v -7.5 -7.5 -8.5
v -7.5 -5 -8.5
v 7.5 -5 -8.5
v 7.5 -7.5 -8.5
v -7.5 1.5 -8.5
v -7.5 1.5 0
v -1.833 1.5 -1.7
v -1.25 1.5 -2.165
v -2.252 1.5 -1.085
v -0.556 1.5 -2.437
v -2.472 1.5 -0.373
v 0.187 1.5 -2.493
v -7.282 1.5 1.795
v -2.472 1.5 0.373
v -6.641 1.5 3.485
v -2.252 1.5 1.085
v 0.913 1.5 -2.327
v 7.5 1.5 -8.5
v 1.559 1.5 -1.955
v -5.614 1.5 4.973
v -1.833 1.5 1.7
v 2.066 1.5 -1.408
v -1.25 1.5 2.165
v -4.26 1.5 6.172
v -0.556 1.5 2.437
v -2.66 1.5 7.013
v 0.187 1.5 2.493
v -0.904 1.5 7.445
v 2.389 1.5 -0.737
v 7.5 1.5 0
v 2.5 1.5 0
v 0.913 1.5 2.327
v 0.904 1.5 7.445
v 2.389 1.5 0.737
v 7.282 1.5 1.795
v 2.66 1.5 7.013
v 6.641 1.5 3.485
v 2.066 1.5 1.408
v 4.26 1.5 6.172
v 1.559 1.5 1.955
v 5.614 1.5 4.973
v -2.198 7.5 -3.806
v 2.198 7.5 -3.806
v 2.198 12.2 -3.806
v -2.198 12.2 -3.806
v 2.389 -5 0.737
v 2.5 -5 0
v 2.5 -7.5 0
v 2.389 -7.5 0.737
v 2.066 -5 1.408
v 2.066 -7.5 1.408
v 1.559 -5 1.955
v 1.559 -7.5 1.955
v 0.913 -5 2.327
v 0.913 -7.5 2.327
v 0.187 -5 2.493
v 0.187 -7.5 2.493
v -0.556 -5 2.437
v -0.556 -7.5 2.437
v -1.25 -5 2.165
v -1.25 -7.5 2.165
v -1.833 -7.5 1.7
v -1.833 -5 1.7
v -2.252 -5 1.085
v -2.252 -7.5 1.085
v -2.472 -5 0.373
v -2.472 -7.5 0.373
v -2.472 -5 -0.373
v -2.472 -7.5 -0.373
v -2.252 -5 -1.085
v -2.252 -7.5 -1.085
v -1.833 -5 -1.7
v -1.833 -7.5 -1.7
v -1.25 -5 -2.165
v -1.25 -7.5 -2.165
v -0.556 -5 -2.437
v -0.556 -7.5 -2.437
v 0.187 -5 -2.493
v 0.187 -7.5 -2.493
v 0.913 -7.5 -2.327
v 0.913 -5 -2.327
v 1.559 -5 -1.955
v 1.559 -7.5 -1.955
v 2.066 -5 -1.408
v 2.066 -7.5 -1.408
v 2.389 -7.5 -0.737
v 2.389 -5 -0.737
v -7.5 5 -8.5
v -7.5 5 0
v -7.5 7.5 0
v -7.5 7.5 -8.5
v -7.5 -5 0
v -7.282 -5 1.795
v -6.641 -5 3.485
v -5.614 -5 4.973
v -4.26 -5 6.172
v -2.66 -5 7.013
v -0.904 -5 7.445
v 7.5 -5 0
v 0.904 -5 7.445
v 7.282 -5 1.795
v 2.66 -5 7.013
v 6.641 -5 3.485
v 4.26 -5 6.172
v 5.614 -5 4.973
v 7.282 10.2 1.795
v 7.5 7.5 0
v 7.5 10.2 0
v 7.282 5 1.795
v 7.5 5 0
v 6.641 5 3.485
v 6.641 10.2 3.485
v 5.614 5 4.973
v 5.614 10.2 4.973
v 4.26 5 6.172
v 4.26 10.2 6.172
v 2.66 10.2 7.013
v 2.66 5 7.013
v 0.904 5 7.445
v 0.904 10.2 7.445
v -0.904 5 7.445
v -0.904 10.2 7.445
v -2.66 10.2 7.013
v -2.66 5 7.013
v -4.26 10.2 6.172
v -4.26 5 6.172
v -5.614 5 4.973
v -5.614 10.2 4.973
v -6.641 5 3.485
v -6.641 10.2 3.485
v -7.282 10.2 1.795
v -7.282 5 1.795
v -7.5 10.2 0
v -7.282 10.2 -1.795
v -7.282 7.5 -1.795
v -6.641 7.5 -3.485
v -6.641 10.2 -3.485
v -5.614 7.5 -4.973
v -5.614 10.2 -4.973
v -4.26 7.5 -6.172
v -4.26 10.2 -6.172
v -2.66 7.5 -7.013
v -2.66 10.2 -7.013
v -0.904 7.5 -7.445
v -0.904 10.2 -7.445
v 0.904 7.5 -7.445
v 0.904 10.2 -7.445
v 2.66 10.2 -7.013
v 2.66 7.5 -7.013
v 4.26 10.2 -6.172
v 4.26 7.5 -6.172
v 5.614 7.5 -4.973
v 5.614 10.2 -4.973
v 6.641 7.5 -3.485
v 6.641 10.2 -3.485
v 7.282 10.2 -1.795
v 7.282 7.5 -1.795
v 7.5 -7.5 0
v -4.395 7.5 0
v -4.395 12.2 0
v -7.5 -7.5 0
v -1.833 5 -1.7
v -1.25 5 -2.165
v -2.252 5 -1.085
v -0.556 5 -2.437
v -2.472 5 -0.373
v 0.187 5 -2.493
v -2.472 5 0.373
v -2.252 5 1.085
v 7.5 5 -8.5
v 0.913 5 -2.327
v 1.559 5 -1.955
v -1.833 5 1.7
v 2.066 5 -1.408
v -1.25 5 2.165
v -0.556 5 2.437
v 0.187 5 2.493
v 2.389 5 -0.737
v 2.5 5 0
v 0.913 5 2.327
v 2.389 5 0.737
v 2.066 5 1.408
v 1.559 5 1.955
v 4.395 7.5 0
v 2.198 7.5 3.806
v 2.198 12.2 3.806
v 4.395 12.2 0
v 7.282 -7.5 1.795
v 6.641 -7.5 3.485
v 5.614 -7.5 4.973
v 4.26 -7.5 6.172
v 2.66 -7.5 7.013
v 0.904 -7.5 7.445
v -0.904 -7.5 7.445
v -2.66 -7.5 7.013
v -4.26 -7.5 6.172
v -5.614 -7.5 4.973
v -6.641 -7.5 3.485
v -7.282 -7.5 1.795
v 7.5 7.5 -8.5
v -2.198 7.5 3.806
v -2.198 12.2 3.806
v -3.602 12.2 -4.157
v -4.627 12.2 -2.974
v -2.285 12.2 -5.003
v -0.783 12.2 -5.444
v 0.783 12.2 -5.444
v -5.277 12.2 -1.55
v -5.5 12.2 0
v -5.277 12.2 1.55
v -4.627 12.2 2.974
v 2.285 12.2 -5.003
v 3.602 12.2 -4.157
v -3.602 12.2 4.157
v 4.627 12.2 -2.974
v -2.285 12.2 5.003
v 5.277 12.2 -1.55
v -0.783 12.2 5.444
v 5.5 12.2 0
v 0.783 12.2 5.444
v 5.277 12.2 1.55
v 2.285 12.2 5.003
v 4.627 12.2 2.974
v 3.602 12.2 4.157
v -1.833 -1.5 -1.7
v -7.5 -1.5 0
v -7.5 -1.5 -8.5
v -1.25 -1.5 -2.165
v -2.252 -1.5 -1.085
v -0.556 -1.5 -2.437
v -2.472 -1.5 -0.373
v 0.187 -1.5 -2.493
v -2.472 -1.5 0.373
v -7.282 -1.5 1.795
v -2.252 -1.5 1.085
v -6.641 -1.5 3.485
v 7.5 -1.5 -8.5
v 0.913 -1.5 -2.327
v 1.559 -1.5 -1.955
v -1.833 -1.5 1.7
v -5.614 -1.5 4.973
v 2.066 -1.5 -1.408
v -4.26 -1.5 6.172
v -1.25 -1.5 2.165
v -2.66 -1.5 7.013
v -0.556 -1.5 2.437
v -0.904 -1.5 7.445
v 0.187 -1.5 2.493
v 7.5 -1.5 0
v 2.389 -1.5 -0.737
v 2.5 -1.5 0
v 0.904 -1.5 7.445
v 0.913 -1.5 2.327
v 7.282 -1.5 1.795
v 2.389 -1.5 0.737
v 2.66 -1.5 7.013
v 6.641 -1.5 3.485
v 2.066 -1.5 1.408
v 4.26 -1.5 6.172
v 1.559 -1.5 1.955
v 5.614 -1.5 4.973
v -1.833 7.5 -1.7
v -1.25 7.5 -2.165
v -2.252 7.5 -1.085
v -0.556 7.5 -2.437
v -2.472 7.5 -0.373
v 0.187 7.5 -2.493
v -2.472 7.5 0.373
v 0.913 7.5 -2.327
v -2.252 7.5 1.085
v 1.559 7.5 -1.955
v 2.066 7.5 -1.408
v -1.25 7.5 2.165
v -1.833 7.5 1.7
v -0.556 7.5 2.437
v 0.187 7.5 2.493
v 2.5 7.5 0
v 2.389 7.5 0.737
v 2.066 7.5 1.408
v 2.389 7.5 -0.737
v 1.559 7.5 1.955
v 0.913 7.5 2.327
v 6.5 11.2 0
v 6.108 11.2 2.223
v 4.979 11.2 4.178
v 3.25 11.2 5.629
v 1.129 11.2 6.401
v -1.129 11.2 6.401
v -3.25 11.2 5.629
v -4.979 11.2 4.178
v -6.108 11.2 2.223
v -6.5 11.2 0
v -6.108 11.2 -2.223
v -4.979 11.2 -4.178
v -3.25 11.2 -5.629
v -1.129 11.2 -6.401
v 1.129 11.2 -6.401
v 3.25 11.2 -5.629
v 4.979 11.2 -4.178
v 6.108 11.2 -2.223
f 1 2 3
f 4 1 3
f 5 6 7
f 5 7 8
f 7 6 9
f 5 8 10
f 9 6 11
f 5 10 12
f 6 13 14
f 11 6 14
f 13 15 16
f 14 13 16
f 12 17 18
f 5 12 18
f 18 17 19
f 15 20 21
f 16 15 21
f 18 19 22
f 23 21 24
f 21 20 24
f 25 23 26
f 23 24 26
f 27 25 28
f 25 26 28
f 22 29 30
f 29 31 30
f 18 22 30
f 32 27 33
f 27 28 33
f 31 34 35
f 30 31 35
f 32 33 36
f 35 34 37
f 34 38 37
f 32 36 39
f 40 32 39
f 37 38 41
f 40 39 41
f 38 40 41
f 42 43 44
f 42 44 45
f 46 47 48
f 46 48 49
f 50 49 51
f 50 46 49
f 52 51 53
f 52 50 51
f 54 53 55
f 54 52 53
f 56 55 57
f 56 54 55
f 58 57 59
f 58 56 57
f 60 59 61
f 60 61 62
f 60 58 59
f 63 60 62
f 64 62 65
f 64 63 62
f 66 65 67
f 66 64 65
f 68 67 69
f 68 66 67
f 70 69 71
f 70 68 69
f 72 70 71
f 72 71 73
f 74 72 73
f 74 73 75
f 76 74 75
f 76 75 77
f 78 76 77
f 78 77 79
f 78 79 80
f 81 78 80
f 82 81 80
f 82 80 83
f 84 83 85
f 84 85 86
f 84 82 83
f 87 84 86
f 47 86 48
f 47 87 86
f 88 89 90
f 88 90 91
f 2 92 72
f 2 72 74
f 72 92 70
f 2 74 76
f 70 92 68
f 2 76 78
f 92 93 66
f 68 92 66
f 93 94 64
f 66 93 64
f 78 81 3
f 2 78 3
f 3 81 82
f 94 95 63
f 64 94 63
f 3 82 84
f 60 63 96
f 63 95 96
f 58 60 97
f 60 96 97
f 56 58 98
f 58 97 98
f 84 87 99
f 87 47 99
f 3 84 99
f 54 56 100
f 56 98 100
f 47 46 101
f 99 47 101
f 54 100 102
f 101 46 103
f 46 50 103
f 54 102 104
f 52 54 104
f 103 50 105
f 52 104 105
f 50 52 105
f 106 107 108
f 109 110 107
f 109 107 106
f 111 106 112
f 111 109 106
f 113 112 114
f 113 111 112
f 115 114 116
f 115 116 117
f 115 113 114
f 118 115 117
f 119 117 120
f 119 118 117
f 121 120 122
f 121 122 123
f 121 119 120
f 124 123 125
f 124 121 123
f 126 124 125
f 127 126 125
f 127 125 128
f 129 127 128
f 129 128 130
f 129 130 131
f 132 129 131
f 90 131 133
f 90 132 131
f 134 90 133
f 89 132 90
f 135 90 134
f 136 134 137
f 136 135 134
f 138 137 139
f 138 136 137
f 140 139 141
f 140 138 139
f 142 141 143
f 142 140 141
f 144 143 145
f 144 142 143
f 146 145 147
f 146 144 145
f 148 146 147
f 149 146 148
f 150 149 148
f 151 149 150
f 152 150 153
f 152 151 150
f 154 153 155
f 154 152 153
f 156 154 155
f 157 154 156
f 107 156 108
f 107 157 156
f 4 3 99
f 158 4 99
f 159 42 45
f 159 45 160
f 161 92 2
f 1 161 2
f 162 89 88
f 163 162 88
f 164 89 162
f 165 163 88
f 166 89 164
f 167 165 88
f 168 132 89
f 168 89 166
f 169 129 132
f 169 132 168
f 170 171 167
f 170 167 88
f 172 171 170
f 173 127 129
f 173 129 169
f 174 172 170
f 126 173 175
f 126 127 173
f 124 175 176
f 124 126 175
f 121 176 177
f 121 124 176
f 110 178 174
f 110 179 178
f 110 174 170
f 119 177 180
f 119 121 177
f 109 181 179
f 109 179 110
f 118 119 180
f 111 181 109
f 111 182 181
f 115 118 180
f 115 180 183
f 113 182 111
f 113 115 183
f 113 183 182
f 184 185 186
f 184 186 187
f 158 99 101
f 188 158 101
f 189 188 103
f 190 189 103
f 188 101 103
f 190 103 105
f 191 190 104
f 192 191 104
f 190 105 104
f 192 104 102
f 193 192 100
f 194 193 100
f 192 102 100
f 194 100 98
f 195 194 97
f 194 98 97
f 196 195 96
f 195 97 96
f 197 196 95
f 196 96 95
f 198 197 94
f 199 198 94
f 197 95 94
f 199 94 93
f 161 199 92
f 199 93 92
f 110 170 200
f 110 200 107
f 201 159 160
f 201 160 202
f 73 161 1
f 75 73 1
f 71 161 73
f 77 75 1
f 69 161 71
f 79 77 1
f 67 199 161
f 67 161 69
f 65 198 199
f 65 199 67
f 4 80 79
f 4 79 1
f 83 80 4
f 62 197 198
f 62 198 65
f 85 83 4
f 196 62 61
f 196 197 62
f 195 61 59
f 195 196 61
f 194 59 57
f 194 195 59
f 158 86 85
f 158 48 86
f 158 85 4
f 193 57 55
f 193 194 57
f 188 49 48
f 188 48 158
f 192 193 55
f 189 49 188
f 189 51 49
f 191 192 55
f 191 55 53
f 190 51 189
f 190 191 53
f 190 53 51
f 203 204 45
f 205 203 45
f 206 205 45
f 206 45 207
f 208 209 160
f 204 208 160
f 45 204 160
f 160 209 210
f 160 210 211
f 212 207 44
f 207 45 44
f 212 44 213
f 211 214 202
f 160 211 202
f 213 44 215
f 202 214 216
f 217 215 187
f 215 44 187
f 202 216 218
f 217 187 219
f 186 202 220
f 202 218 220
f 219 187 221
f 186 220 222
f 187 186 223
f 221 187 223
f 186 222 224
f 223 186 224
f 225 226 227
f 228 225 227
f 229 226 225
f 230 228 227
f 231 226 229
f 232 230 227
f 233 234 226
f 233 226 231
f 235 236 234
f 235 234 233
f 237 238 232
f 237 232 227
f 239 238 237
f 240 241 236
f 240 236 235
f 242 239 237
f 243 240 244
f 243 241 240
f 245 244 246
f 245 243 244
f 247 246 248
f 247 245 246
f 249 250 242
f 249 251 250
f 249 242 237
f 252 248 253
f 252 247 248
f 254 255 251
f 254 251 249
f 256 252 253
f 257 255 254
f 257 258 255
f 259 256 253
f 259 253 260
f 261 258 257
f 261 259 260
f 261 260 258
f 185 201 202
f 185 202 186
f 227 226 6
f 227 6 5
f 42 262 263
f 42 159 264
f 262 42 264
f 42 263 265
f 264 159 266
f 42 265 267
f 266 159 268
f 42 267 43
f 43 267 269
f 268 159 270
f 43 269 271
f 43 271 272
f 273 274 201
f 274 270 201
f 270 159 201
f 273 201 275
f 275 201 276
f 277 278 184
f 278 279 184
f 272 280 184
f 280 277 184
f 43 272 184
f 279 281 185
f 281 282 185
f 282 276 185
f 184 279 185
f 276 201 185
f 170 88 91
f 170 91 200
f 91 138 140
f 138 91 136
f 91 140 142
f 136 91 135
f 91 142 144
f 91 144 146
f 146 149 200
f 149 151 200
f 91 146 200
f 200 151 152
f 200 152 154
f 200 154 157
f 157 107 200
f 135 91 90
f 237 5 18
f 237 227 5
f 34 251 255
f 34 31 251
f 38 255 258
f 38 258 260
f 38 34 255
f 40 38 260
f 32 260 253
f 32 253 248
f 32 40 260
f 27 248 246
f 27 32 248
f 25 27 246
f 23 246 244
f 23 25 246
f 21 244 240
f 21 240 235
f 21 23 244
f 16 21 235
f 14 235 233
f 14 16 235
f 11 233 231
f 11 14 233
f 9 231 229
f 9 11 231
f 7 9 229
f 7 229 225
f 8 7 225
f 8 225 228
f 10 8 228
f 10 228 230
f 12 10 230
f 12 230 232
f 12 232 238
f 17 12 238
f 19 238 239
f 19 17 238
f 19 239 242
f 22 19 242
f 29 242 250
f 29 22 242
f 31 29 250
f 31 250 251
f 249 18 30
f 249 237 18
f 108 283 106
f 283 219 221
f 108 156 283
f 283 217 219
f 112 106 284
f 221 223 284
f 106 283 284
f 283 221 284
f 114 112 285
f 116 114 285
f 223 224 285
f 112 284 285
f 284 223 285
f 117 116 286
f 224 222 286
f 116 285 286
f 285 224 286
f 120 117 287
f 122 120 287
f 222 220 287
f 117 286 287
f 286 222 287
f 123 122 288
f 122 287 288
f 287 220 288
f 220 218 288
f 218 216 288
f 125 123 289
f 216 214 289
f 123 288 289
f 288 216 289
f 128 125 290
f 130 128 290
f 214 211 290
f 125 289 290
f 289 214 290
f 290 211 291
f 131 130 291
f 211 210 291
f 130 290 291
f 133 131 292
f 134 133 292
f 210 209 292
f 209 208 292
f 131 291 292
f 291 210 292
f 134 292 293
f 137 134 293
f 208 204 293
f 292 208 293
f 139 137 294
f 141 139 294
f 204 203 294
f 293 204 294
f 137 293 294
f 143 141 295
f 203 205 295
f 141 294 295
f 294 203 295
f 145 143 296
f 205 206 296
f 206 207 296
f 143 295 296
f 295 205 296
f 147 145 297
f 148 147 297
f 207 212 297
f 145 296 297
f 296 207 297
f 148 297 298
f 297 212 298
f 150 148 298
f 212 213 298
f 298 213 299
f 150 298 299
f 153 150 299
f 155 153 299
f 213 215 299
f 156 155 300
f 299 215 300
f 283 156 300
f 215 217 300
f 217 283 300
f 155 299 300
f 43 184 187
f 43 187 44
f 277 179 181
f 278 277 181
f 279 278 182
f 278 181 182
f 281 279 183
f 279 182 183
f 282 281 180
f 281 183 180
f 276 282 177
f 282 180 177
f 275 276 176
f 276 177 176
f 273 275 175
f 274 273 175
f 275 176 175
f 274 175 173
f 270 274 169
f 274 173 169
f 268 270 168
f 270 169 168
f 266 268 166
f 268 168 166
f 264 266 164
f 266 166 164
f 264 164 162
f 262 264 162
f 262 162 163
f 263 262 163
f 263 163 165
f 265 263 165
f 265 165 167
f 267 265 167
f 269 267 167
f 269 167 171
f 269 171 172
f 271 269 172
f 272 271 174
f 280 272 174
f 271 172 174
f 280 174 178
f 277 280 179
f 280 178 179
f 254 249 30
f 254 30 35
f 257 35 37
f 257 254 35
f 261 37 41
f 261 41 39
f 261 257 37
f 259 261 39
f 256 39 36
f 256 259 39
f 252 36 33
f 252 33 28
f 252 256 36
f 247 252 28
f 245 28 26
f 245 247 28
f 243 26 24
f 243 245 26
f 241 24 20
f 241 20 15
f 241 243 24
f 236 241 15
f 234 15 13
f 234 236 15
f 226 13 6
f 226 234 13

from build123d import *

# Parameters (mm, degrees)
F0_R     = 2.5
F1_DEPTH = 1.5
F2_START = 5
F2_DEPTH = 2.5
F3_START = -5
F3_DEPTH = 2.5
F4_START = -7.5
F4_DEPTH = 4.7
F5_SIZE  = 2


with BuildPart() as f1:
    # F0 (on Front) → F1 (new body, symmetric)
    with BuildSketch(Plane.XZ):
        with BuildLine():
            Line((7.5, -8.5), (7.5, 0))
            ThreePointArc((7.5, 0), (0, -7.5), (-7.5, 0))
            Line((-7.5, 0), (-7.5, -8.5))
            Line((-7.5, -8.5), (7.5, -8.5))
        make_face()
        with BuildLine():
            ThreePointArc((-7.5, 0), (0, -7.5), (7.5, 0))
            ThreePointArc((7.5, 0), (0, 7.5), (-7.5, 0))
        make_face()
        Polygon((2.1975, 3.8061816496), (4.395, 0), (2.1975, -3.8061816496), (-2.1975, -3.8061816496), (-4.395, 0), (-2.1975, 3.8061816496), align=None, mode=Mode.SUBTRACT)
        Polygon((2.1975, -3.8061816496), (4.395, 0), (2.1975, 3.8061816496), (-2.1975, 3.8061816496), (-4.395, 0), (-2.1975, -3.8061816496), align=None)
        Circle(F0_R, mode=Mode.SUBTRACT)
    extrude(amount=F1_DEPTH, both=True)


with BuildPart() as f2:
    # F0 (on Front) → F2 (new body)
    with BuildSketch(Plane.XZ.offset(F2_START)):
        with BuildLine():
            Line((7.5, -8.5), (7.5, 0))
            ThreePointArc((7.5, 0), (0, -7.5), (-7.5, 0))
            Line((-7.5, 0), (-7.5, -8.5))
            Line((-7.5, -8.5), (7.5, -8.5))
        make_face()
        with BuildLine():
            ThreePointArc((-7.5, 0), (0, -7.5), (7.5, 0))
            ThreePointArc((7.5, 0), (0, 7.5), (-7.5, 0))
        make_face()
        Polygon((2.1975, 3.8061816496), (4.395, 0), (2.1975, -3.8061816496), (-2.1975, -3.8061816496), (-4.395, 0), (-2.1975, 3.8061816496), align=None, mode=Mode.SUBTRACT)
        Polygon((2.1975, -3.8061816496), (4.395, 0), (2.1975, 3.8061816496), (-2.1975, 3.8061816496), (-4.395, 0), (-2.1975, -3.8061816496), align=None)
        Circle(F0_R, mode=Mode.SUBTRACT)
    extrude(amount=F2_DEPTH)


with BuildPart() as f3:
    # F0 (on Front) → F3 (new body)
    with BuildSketch(Plane.XZ.offset(F3_START)):
        with BuildLine():
            ThreePointArc((-7.5, 0), (0, -7.5), (7.5, 0))
            ThreePointArc((7.5, 0), (0, 7.5), (-7.5, 0))
        make_face()
        Polygon((2.1975, 3.8061816496), (4.395, 0), (2.1975, -3.8061816496), (-2.1975, -3.8061816496), (-4.395, 0), (-2.1975, 3.8061816496), align=None, mode=Mode.SUBTRACT)
        with BuildLine():
            Line((7.5, -8.5), (7.5, 0))
            ThreePointArc((7.5, 0), (0, -7.5), (-7.5, 0))
            Line((-7.5, 0), (-7.5, -8.5))
            Line((-7.5, -8.5), (7.5, -8.5))
        make_face()
        Polygon((2.1975, -3.8061816496), (4.395, 0), (2.1975, 3.8061816496), (-2.1975, 3.8061816496), (-4.395, 0), (-2.1975, -3.8061816496), align=None)
        Circle(F0_R, mode=Mode.SUBTRACT)
    extrude(amount=-F3_DEPTH)

    # F0 (on Front) → F4 (join)
    with BuildSketch(Plane.XZ.offset(F4_START)):
        with BuildLine():
            ThreePointArc((-7.5, 0), (0, -7.5), (7.5, 0))
            ThreePointArc((7.5, 0), (0, 7.5), (-7.5, 0))
        make_face()
        Polygon((2.1975, 3.8061816496), (4.395, 0), (2.1975, -3.8061816496), (-2.1975, -3.8061816496), (-4.395, 0), (-2.1975, 3.8061816496), align=None, mode=Mode.SUBTRACT)
    extrude(amount=-F4_DEPTH)

    # F5
    f5_edges = [f3.edges().sort_by_distance(p)[0] for p in [
        (-7.5, 12.2, 0),
    ]]
    chamfer(f5_edges, length=F5_SIZE)


solid = Compound([f1.part, f2.part, f3.part])
